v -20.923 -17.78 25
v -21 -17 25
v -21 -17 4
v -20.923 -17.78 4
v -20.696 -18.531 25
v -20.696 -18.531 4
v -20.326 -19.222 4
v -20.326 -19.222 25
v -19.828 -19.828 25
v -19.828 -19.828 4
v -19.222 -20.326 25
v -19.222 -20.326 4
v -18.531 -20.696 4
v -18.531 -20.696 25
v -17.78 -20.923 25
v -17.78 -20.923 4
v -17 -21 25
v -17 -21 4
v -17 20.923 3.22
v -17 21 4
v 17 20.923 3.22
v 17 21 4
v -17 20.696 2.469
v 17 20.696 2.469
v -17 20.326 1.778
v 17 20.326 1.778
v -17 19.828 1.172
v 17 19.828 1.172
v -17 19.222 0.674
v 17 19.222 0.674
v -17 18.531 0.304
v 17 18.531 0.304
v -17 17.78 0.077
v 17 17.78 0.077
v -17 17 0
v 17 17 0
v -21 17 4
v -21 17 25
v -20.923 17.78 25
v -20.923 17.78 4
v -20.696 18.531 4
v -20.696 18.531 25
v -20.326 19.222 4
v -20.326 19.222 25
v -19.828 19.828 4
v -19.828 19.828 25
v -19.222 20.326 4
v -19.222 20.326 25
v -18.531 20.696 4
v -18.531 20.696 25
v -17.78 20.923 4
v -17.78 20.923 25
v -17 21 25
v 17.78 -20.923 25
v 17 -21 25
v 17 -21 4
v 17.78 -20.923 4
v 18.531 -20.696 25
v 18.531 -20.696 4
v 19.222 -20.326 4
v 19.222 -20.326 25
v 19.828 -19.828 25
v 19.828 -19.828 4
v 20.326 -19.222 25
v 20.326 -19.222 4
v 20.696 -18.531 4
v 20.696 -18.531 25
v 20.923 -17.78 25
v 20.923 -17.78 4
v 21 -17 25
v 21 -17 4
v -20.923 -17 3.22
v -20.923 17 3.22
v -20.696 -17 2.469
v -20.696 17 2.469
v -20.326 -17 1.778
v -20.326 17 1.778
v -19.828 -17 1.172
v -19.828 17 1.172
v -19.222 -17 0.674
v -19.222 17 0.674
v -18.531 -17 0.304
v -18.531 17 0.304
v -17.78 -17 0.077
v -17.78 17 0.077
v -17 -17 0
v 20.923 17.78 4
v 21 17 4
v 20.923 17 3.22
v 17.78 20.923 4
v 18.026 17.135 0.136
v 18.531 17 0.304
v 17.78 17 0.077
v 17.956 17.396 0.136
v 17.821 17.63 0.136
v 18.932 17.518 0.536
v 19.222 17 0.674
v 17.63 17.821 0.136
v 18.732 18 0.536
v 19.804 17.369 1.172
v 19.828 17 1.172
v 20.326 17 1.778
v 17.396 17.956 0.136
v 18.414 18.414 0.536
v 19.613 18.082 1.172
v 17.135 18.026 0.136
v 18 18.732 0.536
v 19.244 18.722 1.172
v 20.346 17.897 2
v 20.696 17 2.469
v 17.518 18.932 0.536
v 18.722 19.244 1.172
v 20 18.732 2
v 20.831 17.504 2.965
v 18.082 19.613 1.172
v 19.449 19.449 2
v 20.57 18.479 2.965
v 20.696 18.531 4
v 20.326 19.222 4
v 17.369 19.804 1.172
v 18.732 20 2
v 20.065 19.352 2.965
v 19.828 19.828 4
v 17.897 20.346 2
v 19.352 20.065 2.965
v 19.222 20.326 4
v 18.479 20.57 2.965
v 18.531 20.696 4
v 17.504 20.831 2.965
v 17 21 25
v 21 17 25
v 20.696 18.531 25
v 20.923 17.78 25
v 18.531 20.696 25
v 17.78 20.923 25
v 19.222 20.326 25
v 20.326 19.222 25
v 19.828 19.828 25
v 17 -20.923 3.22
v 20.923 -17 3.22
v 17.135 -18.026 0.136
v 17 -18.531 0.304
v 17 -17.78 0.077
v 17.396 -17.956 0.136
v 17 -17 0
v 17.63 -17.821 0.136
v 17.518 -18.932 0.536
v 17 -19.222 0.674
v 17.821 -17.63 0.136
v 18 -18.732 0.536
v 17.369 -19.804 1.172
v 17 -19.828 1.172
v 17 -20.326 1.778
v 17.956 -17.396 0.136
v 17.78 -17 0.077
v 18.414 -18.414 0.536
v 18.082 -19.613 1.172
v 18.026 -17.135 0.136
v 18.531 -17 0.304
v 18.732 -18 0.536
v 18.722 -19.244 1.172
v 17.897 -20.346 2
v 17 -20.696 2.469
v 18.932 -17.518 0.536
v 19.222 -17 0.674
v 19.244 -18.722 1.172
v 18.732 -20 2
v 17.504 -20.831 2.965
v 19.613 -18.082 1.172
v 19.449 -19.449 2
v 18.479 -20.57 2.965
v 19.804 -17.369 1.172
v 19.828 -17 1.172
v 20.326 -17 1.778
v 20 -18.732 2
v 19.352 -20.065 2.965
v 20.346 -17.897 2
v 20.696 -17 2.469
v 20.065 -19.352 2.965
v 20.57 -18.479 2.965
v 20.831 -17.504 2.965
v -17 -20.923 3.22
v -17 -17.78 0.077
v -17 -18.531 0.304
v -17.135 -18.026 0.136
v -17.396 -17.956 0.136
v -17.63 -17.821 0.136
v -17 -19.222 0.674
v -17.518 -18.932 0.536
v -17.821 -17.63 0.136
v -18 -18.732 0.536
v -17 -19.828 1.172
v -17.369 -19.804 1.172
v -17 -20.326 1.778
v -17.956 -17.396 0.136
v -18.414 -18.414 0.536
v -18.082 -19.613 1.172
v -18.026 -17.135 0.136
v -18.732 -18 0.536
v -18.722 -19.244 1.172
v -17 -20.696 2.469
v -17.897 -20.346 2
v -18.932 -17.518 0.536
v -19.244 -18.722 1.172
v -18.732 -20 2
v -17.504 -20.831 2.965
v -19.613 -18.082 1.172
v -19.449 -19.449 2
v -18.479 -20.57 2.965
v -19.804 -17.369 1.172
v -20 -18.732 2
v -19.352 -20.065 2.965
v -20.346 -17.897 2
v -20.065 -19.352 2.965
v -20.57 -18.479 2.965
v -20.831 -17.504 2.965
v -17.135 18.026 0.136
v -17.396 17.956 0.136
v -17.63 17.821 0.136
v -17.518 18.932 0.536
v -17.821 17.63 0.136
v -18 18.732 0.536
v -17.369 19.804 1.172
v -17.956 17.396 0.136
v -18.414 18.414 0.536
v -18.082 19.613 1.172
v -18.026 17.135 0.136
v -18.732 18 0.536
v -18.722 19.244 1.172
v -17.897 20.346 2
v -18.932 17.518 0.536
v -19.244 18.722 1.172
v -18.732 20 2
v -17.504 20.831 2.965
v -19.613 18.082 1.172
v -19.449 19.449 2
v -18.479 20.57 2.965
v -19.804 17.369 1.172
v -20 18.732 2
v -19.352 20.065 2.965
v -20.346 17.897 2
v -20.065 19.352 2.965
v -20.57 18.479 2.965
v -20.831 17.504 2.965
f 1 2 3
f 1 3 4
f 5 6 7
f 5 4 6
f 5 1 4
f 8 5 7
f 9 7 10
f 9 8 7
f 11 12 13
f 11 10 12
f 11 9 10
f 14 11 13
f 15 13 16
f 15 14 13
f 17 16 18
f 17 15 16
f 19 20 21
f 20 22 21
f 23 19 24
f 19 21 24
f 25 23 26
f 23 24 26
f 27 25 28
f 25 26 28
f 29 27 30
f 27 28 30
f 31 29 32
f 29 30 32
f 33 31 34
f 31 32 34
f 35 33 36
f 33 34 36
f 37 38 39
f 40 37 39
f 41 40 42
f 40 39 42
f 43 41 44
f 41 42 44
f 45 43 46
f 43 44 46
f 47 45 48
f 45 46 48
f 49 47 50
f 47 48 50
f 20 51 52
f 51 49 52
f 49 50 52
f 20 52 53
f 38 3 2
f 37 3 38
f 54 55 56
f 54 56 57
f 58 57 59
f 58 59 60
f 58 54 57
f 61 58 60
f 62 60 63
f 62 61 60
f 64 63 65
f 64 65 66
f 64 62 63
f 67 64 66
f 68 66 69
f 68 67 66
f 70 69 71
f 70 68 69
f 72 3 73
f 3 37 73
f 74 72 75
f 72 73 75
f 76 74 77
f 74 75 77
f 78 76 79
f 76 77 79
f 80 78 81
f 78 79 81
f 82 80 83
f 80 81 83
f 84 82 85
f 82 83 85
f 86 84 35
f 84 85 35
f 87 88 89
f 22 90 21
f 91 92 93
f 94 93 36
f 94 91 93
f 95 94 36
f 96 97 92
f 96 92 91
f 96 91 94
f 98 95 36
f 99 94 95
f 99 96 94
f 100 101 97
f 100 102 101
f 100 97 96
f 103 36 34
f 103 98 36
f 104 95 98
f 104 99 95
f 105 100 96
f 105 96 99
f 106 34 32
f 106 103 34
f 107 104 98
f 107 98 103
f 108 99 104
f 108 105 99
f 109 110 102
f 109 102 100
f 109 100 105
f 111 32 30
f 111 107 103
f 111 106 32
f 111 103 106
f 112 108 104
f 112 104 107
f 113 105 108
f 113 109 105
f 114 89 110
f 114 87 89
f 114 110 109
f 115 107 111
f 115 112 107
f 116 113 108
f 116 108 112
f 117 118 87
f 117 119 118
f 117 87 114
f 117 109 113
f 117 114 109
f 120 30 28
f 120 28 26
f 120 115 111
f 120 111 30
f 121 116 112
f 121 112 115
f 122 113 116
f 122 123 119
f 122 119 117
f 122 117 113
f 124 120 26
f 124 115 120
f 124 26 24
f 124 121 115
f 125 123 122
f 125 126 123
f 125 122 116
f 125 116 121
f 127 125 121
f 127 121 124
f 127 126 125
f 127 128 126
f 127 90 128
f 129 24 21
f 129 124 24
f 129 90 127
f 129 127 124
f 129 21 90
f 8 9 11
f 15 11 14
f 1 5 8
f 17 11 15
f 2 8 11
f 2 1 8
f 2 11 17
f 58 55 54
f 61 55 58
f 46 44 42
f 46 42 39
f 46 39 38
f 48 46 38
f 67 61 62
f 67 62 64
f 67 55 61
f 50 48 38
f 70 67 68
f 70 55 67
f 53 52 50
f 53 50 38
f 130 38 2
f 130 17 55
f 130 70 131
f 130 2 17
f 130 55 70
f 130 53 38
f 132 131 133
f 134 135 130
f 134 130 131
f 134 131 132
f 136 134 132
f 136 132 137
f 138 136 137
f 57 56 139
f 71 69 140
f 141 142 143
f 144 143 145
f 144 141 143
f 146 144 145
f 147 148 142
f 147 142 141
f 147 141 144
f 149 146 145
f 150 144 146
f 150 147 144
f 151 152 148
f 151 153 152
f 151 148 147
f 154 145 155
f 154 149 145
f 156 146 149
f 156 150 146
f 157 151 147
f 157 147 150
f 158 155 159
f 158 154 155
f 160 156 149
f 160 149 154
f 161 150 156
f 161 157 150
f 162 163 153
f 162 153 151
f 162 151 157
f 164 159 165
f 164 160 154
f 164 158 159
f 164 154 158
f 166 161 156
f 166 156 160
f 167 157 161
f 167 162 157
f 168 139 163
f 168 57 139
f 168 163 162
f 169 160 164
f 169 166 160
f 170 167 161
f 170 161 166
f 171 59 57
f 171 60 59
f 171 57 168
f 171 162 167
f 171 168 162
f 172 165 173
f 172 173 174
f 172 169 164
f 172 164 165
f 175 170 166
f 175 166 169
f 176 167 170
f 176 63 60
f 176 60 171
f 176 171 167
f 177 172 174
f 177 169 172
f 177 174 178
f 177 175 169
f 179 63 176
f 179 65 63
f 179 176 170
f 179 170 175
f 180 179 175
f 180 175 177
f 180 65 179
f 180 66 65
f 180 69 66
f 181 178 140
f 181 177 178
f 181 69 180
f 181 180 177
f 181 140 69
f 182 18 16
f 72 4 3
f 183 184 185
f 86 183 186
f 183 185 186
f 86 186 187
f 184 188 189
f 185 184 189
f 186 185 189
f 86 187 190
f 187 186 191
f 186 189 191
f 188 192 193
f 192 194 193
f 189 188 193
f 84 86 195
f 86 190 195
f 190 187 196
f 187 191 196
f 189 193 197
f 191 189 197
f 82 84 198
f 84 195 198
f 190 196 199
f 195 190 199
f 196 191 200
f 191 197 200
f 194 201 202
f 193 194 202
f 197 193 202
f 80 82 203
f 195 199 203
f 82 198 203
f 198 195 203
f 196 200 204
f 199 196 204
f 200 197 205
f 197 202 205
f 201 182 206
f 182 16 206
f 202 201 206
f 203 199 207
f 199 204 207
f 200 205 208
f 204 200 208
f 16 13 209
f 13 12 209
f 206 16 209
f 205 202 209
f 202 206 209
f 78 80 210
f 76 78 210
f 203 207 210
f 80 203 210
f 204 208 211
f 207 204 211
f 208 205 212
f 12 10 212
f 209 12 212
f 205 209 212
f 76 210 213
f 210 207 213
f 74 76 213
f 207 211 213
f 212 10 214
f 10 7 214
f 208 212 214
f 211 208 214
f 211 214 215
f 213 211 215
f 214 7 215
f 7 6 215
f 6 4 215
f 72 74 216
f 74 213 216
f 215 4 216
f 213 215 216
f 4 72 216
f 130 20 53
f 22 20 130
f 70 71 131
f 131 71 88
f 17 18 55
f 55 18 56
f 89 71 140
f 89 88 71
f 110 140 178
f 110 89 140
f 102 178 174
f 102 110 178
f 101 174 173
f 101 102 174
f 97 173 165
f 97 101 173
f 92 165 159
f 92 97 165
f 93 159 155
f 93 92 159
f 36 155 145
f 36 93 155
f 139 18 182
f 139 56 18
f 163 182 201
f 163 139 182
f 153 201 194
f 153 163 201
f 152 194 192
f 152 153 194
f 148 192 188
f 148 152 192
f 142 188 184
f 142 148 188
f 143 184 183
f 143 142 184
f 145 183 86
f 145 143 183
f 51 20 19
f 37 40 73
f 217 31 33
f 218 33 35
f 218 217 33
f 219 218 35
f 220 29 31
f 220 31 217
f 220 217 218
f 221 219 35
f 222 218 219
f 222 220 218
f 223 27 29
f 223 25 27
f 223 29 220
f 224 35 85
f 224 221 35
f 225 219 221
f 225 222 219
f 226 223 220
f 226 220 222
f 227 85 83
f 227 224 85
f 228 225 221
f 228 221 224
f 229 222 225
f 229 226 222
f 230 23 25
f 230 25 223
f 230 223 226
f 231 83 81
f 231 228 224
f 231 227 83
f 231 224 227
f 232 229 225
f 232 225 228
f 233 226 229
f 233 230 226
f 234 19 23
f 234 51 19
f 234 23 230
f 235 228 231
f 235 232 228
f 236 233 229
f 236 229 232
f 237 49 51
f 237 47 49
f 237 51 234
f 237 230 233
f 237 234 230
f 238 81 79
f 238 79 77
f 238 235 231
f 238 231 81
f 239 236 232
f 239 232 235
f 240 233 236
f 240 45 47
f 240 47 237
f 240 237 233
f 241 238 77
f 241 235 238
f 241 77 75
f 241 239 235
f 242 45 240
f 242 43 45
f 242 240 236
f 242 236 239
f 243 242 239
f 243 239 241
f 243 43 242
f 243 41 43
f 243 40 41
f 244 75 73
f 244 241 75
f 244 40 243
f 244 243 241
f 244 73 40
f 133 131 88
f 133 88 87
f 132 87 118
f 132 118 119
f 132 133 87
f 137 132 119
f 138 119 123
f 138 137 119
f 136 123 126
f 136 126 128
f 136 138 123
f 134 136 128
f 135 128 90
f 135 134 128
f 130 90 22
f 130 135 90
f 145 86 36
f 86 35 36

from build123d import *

# Parameters (mm, degrees)
F0_W     = 42
F0_H     = 42
F1_DEPTH = 40
F2_R     = 4
F3_W     = 51.3974614441
F3_H     = 62.1256567538
F3_W_2   = 34
F3_H_2   = 34
F4_DEPTH = 15


with BuildPart() as f1:
    # F0 (on Top) → F1 (new body)
    with BuildSketch(Plane.XY):
        Rectangle(F0_W, F0_H)
    extrude(amount=F1_DEPTH)

    # F2
    f2_edges = [f1.edges().sort_by_distance(p)[0] for p in [
        (-21, -21, 20),
        (21, -21, 20),
        (0, -21, 0),
        (0, -21, 40),
        (21, 0, 40),
        (0, 21, 40),
        (-21, 0, 40),
        (21, 21, 20),
        (21, 0, 0),
        (-21, 21, 20),
        (0, 21, 0),
        (-21, 0, 0),
    ]]
    fillet(f2_edges, radius=F2_R)

    # F3 (on face) → F4 (cut)
    with BuildSketch(Plane.XY.offset(40)):
        Rectangle(F3_W, F3_H)
        Rectangle(F3_W_2, F3_H_2, mode=Mode.SUBTRACT)
        Rectangle(F3_W_2, F3_H_2)
    extrude(amount=-F4_DEPTH, mode=Mode.SUBTRACT)


solid = f1.part
